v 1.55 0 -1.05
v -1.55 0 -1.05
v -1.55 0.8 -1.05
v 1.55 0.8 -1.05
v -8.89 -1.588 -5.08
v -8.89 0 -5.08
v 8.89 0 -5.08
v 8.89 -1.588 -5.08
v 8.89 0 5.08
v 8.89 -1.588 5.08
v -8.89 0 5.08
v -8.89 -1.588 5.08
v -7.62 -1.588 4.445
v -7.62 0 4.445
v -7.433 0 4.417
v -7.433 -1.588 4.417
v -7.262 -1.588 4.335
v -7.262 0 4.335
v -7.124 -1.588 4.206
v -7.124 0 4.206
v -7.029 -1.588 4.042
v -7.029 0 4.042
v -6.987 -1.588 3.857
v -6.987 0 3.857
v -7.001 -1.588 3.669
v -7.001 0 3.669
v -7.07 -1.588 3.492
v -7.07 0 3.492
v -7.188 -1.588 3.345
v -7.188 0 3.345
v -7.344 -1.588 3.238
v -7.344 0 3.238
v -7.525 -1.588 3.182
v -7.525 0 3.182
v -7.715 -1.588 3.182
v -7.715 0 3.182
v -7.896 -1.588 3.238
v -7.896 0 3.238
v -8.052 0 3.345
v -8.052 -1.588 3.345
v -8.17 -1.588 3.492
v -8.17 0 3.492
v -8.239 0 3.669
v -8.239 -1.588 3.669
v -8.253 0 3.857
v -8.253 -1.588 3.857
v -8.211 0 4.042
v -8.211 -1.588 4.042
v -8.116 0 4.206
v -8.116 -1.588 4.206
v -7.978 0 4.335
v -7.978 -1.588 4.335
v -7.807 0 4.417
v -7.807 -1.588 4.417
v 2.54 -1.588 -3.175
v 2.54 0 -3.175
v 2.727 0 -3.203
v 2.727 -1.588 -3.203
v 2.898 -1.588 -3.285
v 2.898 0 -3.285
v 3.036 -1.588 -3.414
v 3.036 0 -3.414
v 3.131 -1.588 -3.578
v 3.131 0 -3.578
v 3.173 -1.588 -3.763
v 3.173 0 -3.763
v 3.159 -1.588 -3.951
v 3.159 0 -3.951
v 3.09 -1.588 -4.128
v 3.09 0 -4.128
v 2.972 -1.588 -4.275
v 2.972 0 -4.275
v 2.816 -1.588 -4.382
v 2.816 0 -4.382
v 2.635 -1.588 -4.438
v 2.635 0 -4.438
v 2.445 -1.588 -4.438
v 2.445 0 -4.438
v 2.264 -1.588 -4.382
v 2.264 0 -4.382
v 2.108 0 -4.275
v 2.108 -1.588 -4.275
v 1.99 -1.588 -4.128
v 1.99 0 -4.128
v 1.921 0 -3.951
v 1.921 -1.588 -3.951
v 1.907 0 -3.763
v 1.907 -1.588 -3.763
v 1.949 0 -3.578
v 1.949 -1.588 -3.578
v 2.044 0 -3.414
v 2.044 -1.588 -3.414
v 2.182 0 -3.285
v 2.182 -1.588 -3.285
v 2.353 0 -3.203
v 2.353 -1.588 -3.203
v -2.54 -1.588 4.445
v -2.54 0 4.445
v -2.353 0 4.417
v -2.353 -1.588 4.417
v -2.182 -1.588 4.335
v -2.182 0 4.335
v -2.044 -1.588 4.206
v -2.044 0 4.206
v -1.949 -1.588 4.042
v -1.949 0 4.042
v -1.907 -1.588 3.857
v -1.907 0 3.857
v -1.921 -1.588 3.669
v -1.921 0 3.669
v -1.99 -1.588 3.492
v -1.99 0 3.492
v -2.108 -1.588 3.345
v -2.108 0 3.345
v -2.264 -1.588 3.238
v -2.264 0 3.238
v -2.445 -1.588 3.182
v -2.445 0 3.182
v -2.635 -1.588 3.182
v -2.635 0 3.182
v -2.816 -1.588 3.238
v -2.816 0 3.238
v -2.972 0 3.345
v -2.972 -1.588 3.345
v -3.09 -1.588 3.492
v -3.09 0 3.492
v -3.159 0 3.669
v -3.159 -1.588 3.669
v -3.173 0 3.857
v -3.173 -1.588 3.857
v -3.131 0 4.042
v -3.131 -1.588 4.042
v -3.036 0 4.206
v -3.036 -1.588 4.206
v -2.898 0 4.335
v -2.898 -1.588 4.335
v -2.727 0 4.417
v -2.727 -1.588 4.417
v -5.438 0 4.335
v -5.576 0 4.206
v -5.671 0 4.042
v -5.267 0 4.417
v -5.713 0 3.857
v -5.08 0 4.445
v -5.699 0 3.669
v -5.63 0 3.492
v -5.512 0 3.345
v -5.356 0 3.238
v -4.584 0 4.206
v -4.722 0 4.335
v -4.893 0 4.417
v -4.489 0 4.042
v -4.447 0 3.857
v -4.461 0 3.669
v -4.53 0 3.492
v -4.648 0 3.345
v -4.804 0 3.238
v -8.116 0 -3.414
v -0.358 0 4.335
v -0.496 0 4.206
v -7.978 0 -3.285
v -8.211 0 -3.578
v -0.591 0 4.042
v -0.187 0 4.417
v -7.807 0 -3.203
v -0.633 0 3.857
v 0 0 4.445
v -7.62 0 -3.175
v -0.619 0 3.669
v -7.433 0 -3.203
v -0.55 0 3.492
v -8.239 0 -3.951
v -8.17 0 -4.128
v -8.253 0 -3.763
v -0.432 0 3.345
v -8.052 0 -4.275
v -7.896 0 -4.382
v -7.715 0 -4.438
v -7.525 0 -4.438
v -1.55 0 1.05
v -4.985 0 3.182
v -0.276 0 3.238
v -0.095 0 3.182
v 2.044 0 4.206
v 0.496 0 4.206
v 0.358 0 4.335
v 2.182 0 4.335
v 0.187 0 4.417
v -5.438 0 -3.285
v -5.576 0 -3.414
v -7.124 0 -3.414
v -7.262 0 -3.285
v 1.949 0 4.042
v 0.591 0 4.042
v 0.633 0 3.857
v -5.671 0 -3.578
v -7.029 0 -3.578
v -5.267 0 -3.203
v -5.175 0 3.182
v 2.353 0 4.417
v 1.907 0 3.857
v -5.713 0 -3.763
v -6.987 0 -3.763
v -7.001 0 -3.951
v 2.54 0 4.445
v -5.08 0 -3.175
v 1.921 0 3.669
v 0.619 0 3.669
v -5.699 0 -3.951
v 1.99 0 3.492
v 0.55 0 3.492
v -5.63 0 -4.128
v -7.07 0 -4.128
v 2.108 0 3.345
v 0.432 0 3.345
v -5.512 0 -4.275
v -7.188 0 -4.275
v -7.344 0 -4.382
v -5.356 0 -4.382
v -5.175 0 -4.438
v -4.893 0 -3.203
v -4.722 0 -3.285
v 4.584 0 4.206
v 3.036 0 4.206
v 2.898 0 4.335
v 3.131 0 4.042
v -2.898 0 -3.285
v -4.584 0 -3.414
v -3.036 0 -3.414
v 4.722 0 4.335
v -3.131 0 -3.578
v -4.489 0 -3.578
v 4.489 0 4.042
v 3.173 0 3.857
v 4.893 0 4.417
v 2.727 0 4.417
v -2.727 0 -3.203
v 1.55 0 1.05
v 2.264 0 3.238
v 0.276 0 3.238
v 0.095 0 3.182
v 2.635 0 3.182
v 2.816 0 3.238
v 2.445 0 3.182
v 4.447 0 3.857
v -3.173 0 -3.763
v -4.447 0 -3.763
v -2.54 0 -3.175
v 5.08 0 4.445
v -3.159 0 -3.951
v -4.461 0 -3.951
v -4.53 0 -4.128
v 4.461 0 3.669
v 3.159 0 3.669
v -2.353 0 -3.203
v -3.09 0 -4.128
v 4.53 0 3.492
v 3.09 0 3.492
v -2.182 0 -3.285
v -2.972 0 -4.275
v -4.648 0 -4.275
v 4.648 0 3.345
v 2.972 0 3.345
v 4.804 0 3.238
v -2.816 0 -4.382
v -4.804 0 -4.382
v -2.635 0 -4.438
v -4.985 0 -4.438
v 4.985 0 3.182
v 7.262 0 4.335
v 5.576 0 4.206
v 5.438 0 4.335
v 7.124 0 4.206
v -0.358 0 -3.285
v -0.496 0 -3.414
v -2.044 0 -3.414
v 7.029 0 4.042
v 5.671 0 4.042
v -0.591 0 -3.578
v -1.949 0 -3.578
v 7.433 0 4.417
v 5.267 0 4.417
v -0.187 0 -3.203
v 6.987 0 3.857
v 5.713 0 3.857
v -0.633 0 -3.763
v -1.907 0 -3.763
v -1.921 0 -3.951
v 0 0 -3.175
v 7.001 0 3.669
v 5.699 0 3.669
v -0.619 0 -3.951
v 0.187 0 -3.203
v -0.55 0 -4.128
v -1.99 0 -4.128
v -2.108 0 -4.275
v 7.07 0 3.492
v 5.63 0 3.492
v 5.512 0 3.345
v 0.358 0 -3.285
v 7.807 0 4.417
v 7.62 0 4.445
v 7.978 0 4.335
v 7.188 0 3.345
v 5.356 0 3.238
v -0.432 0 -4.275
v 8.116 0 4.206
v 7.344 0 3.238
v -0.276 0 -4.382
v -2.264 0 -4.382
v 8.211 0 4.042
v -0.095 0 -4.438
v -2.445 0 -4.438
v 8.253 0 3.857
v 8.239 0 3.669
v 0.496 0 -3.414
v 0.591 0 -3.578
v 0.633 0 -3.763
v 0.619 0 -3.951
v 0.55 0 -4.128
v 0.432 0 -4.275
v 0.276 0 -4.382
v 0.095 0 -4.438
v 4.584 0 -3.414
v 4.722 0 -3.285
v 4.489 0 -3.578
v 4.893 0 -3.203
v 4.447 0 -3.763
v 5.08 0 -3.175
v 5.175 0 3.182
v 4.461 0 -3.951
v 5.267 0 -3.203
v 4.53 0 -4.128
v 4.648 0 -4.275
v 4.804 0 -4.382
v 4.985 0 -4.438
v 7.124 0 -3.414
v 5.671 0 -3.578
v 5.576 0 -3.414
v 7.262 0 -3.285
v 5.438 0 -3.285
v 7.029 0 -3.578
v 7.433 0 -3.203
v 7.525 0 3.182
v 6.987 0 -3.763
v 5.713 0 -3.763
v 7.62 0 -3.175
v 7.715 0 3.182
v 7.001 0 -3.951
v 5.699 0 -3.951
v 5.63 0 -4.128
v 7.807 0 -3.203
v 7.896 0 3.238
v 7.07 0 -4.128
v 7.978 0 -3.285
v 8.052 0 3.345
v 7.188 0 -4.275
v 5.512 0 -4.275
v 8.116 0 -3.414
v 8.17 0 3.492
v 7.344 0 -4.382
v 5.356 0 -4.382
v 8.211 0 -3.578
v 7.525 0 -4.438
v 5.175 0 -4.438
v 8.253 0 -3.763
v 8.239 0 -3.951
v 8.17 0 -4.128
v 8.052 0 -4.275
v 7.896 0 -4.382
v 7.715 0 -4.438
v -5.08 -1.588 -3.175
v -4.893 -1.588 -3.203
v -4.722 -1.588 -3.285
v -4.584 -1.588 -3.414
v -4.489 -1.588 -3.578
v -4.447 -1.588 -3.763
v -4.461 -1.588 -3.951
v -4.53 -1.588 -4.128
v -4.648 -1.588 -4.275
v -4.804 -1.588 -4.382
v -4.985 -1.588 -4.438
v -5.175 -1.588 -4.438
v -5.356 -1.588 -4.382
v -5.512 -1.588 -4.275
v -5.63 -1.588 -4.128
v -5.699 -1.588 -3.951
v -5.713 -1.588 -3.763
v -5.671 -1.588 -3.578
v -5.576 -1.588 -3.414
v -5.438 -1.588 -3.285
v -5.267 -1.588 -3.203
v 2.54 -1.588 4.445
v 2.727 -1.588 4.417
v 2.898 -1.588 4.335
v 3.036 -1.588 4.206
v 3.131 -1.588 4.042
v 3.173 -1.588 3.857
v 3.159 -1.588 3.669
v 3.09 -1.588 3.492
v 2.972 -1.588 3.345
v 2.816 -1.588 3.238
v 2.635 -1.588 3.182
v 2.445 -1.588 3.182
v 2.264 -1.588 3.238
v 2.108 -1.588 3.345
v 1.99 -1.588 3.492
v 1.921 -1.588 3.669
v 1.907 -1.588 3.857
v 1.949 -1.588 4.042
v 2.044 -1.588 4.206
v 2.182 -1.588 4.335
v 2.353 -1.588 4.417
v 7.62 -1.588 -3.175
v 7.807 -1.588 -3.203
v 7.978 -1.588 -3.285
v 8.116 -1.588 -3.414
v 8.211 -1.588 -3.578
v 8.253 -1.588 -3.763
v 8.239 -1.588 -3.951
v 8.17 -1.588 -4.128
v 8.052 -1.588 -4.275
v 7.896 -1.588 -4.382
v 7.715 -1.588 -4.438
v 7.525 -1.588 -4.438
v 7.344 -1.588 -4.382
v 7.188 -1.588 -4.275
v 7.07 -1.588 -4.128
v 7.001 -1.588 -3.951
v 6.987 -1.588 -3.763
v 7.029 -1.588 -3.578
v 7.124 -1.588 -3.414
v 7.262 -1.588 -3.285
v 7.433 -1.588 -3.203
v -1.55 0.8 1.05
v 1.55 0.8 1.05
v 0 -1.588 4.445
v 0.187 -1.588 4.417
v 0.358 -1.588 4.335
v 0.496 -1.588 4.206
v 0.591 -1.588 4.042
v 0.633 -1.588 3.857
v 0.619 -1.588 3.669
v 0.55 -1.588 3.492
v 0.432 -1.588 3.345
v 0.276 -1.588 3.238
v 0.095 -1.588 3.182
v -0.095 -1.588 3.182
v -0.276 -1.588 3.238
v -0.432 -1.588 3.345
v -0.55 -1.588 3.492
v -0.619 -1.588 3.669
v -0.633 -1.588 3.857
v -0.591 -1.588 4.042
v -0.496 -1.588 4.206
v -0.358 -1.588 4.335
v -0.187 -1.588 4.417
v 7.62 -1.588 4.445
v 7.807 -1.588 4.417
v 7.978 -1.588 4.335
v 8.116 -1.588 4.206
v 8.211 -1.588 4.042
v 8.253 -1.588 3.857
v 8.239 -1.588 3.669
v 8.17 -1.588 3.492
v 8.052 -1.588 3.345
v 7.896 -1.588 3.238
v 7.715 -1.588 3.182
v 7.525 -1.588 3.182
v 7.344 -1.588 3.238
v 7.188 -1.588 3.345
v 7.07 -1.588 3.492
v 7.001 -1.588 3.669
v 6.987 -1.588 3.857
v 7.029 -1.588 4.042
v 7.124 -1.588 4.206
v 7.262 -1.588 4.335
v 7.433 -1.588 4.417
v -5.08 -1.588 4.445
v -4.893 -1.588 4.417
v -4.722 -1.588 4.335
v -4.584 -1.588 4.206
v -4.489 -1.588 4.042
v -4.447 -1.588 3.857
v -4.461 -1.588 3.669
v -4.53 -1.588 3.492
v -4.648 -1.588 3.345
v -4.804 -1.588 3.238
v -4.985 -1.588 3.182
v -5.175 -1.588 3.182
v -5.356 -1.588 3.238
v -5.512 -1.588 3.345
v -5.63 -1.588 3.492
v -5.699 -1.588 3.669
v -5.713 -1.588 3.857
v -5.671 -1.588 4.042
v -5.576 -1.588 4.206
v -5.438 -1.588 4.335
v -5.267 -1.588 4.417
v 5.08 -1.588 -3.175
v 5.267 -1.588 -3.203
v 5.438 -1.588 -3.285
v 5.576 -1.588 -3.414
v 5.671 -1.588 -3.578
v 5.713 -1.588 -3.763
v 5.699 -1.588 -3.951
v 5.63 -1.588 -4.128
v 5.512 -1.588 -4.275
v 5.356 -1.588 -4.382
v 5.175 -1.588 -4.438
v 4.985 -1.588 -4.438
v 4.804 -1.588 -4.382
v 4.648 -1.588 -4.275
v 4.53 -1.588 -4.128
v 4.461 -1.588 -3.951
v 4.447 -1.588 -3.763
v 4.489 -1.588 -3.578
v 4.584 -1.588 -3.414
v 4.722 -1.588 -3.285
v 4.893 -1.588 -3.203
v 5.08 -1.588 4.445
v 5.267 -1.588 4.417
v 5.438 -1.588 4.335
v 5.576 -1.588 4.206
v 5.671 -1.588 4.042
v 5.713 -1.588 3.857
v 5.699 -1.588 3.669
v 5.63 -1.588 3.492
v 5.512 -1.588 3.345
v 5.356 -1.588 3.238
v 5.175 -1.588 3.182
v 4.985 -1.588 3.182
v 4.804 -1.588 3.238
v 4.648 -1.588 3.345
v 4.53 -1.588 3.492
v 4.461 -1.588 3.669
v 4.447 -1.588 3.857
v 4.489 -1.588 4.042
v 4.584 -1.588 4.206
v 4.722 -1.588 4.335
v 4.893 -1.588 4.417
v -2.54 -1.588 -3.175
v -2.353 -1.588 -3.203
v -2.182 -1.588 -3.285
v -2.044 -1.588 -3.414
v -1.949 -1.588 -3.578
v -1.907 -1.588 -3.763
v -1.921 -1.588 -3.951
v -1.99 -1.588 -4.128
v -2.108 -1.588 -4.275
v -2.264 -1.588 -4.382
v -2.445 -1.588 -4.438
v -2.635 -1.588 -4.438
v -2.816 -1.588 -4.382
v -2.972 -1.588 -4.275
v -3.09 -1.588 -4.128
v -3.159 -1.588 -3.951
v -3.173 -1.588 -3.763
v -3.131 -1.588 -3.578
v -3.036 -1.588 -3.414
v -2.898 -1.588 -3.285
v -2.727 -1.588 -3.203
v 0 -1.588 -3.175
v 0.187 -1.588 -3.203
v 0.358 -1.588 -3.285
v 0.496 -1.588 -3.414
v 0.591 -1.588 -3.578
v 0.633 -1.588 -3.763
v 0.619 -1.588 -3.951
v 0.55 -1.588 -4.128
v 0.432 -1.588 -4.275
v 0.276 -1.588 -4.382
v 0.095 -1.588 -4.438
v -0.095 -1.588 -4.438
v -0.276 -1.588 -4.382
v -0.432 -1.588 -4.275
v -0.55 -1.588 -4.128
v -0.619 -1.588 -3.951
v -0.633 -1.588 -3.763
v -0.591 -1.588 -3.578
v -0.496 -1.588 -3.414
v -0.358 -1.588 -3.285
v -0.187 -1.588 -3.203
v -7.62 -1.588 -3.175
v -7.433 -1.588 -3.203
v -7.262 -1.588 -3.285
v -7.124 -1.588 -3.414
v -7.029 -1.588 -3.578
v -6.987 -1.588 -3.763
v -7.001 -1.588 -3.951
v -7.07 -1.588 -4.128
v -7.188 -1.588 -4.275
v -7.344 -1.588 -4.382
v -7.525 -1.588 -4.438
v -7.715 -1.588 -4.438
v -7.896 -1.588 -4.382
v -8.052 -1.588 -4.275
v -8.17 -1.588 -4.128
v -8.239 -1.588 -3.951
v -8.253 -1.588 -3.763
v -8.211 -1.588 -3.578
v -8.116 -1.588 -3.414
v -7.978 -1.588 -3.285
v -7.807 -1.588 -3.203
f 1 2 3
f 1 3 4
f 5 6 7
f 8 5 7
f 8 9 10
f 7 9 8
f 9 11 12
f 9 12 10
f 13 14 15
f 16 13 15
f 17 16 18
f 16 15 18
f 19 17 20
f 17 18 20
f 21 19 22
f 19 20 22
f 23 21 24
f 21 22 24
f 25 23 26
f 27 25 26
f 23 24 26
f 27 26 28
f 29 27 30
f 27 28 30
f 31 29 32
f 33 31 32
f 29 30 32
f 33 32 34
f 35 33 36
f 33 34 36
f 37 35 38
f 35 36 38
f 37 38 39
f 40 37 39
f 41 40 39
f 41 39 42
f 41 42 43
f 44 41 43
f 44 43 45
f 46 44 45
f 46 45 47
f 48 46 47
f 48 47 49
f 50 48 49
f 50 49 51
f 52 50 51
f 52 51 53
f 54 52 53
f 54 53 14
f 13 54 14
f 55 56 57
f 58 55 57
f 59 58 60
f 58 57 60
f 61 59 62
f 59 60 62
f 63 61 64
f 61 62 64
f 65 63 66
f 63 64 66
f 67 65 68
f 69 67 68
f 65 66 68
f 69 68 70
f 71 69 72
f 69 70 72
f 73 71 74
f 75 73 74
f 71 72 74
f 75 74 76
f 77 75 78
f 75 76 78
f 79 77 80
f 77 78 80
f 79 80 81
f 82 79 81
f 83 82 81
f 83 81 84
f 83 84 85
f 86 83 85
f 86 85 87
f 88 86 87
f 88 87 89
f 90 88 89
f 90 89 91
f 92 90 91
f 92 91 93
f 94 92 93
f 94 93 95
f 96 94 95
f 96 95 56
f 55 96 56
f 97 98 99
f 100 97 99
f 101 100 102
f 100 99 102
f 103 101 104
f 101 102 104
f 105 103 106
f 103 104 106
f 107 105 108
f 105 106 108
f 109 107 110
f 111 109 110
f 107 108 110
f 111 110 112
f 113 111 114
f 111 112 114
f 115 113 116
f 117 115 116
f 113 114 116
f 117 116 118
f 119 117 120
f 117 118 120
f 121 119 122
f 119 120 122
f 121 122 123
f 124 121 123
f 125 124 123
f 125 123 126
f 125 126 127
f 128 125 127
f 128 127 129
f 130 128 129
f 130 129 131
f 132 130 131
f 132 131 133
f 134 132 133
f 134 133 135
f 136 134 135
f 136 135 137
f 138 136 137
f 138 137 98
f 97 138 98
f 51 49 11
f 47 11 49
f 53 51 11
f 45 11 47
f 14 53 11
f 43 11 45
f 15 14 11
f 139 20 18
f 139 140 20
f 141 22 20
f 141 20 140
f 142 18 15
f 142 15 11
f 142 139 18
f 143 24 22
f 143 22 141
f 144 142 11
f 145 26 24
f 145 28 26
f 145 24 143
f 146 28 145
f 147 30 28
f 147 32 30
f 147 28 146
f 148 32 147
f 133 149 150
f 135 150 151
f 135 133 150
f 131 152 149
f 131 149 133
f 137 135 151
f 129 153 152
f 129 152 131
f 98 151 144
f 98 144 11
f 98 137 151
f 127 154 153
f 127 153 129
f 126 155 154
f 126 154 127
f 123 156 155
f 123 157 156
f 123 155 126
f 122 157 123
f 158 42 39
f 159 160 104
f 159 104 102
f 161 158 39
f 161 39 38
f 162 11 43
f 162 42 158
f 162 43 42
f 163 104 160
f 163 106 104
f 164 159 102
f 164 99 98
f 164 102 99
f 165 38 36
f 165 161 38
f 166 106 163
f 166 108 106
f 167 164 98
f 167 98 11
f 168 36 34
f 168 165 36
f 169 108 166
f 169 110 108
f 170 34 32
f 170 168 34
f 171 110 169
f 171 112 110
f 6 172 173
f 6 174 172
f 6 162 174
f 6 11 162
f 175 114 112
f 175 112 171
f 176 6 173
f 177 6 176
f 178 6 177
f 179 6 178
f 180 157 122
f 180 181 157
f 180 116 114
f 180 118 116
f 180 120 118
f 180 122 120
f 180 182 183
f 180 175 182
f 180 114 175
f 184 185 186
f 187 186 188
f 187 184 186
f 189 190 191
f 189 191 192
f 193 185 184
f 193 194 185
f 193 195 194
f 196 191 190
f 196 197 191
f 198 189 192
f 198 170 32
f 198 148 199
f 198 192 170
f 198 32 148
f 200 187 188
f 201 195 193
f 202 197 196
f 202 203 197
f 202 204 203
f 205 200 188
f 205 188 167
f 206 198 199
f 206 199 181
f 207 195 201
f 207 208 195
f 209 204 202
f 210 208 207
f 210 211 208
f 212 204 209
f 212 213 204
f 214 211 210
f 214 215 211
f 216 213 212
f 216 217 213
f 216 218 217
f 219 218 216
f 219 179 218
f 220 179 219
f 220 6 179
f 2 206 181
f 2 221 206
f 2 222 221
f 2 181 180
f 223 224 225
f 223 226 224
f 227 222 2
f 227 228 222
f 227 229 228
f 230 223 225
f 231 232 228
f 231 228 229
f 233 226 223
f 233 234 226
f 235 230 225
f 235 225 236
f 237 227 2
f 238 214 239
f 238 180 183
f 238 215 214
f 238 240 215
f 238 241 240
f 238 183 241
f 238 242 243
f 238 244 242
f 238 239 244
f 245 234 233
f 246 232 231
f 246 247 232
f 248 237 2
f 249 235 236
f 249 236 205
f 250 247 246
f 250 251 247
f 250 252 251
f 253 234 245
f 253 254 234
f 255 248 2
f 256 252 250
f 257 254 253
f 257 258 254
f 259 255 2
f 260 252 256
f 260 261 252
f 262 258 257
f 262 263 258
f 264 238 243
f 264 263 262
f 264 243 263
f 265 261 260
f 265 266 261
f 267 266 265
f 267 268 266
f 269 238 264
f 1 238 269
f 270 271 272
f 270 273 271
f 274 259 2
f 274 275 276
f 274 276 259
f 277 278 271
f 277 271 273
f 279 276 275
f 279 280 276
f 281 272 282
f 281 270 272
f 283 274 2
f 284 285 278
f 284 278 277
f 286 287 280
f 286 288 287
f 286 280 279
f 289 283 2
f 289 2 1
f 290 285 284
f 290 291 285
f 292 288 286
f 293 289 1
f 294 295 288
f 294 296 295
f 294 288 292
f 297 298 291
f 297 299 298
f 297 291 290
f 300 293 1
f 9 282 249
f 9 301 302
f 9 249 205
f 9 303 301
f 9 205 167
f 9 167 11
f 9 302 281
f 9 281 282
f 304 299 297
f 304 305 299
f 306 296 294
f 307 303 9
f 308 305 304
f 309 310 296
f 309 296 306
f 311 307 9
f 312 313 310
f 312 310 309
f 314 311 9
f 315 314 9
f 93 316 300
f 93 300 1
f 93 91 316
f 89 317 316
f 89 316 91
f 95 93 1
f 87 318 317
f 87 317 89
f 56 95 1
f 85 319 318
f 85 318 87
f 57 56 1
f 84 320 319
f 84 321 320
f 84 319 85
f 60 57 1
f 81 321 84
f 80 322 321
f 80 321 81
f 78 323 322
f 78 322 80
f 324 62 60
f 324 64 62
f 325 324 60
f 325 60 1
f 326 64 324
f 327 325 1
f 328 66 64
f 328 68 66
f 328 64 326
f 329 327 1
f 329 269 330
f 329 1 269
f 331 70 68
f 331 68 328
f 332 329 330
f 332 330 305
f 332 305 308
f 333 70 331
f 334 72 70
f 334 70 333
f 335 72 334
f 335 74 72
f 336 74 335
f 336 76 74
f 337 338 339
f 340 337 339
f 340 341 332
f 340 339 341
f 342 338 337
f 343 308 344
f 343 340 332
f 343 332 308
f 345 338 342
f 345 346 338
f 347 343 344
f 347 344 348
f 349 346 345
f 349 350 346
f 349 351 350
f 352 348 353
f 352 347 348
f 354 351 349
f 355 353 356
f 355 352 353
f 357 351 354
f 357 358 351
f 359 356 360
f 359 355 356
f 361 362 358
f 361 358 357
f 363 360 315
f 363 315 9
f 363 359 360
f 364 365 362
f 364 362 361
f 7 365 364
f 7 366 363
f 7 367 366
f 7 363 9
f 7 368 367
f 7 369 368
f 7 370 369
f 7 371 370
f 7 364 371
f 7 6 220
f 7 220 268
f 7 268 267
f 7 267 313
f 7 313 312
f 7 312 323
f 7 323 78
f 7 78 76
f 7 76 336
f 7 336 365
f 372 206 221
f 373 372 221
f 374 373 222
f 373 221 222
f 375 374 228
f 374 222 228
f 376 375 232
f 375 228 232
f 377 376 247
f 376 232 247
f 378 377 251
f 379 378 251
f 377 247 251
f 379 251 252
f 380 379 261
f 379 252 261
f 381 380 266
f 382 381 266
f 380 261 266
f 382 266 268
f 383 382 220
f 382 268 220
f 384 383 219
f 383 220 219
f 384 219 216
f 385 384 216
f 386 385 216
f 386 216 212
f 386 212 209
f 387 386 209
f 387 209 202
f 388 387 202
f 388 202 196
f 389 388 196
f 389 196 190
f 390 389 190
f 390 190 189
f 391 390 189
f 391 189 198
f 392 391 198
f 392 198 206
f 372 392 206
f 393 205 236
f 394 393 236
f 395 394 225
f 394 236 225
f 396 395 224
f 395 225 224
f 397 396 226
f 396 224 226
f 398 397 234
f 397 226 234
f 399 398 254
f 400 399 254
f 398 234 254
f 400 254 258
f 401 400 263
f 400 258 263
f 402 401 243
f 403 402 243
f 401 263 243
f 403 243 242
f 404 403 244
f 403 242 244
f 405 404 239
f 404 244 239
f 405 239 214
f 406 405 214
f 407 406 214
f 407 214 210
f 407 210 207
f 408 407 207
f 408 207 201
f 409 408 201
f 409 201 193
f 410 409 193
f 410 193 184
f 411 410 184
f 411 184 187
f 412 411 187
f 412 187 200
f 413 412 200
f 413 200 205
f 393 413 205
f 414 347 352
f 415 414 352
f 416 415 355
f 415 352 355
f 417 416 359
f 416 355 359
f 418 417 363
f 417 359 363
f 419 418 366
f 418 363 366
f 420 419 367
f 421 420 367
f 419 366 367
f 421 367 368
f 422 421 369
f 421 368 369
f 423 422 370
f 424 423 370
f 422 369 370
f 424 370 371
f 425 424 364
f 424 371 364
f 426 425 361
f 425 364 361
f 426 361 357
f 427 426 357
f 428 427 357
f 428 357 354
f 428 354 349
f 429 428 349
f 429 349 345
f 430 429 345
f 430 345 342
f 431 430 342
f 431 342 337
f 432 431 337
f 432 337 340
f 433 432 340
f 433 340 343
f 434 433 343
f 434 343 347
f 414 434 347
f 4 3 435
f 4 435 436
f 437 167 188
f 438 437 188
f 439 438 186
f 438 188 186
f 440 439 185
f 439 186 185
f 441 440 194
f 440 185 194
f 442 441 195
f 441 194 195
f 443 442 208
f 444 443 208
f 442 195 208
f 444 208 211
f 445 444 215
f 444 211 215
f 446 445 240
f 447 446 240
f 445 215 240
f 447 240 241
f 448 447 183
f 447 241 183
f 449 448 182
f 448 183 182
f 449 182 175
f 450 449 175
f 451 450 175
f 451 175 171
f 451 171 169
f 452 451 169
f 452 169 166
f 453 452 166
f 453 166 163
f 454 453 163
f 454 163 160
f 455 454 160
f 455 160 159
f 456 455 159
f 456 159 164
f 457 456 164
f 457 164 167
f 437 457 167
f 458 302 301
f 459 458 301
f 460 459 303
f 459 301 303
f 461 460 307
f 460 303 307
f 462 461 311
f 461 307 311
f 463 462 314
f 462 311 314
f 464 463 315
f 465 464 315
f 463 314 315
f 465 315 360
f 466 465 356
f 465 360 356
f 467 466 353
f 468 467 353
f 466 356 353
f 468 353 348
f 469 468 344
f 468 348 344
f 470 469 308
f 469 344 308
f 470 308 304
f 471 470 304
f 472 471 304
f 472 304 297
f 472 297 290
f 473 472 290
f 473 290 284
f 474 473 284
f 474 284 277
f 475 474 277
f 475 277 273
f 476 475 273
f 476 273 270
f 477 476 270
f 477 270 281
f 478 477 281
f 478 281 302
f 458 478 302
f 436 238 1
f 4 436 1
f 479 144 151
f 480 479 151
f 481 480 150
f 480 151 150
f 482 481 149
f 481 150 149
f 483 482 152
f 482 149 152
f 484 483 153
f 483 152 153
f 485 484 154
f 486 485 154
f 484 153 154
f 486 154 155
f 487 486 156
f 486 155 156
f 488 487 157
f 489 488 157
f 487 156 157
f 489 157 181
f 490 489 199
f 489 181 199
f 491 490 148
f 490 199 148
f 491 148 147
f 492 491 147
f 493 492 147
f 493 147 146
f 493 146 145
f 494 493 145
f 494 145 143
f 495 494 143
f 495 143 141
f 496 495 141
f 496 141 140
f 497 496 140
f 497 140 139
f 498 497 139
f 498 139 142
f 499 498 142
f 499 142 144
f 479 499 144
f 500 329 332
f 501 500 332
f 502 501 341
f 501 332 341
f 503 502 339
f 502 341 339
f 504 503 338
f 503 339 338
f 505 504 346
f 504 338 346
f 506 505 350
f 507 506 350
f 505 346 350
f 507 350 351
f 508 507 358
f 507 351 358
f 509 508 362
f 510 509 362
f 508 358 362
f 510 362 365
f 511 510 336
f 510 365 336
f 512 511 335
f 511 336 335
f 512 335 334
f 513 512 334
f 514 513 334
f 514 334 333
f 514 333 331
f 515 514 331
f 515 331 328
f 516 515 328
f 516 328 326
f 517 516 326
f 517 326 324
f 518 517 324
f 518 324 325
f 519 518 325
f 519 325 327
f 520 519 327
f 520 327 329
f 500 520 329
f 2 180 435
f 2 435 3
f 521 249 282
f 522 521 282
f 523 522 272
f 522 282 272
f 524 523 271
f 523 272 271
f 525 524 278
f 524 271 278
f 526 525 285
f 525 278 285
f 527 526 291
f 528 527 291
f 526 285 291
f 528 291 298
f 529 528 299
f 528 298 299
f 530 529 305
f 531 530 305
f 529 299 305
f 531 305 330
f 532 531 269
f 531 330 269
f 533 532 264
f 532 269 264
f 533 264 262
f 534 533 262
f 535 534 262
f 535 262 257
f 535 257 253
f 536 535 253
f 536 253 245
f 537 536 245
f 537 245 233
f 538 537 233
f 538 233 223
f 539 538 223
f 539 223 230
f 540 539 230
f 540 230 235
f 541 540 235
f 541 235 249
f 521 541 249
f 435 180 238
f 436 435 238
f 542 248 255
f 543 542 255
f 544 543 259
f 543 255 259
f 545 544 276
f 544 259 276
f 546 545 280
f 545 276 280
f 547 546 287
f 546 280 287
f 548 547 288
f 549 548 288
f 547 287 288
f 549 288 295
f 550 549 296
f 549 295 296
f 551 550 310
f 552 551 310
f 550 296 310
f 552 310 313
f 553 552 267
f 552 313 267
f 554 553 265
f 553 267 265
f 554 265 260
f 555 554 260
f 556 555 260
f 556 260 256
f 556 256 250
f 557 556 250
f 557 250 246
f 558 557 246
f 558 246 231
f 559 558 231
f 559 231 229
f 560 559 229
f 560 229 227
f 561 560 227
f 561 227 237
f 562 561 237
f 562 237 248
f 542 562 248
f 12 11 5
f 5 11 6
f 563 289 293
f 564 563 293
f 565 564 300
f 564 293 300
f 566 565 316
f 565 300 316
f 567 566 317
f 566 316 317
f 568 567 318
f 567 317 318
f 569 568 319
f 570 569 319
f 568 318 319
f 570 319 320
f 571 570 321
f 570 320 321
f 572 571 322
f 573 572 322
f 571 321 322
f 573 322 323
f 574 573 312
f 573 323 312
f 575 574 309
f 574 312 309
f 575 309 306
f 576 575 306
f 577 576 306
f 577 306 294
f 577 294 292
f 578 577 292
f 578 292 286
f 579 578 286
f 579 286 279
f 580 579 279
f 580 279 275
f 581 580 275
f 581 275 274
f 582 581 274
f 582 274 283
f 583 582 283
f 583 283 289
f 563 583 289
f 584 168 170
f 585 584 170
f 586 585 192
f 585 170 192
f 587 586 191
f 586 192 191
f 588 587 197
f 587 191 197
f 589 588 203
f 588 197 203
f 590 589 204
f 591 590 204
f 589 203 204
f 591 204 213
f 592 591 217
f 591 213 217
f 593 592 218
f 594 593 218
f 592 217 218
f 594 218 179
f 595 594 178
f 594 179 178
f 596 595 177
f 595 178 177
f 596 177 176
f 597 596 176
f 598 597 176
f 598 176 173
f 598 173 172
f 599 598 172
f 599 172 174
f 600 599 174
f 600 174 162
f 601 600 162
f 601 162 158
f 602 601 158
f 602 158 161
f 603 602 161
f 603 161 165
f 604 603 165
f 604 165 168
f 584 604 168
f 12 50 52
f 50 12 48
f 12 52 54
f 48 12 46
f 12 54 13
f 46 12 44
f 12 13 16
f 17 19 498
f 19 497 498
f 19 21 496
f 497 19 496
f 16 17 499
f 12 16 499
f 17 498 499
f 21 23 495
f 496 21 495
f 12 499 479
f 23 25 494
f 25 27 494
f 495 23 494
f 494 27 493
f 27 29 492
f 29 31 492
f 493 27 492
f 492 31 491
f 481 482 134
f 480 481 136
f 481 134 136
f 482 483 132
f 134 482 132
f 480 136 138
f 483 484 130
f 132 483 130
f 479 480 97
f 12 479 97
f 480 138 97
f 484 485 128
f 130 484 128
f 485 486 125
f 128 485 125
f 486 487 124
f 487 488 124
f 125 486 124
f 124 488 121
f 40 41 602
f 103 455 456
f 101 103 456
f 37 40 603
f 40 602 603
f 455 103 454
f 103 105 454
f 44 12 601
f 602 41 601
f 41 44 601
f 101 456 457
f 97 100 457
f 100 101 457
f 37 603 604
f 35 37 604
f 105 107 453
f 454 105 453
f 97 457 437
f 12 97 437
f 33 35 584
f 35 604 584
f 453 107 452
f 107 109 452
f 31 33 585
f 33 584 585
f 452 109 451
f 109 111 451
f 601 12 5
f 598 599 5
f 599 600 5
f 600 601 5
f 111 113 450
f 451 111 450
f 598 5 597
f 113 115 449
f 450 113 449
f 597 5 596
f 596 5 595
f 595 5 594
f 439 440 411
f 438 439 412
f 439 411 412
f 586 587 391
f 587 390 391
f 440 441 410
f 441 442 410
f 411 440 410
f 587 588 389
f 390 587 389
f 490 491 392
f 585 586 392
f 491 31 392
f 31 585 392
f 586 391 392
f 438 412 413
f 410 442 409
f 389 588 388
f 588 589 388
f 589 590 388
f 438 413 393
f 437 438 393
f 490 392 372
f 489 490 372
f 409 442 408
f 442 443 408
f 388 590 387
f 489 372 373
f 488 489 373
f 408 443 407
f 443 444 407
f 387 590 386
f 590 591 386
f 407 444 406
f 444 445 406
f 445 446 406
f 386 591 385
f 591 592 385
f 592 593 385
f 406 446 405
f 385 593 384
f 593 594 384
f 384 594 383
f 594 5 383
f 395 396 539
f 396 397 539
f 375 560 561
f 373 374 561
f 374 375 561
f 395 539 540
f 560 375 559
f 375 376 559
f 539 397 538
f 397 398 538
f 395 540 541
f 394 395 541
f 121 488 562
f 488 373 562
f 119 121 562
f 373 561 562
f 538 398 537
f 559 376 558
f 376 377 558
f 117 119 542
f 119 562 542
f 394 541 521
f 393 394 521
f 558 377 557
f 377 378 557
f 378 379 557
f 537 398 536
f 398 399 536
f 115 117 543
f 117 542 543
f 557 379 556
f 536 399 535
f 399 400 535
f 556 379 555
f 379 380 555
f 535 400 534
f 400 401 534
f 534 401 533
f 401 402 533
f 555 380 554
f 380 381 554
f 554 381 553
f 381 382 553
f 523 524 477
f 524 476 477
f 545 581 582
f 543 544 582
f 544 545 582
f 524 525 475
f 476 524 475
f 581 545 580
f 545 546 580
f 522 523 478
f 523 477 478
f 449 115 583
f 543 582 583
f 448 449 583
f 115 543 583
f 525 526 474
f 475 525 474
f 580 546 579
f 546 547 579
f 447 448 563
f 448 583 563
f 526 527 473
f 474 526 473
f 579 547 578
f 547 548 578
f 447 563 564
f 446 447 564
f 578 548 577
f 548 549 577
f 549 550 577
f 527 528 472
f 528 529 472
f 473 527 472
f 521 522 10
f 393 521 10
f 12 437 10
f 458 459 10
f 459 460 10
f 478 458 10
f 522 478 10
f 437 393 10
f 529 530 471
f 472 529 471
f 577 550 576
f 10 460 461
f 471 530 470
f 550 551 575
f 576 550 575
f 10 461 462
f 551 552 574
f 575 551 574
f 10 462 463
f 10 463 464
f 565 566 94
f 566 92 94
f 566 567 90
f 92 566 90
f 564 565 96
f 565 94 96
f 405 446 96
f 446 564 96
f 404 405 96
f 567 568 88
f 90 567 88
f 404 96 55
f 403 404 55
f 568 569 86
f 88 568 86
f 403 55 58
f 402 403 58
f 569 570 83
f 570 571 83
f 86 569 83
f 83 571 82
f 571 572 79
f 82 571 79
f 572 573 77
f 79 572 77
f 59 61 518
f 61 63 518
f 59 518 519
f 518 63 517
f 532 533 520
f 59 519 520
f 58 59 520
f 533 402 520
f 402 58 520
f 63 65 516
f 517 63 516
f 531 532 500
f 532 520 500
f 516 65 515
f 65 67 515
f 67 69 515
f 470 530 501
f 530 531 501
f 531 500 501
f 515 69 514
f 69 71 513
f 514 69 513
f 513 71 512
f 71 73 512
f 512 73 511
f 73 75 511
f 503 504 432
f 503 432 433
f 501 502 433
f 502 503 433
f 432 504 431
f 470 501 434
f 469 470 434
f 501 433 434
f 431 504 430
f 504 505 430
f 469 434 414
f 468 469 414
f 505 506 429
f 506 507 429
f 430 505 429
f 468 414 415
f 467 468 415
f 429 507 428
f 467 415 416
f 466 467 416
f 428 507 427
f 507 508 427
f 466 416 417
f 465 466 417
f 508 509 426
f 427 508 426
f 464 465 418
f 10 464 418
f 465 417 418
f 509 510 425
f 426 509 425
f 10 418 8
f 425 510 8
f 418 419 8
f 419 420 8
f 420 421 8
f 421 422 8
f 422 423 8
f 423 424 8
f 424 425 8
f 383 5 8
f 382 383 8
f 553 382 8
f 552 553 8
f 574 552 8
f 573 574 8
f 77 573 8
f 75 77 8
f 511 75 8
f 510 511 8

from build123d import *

# Parameters (mm, degrees)
SKETCH1_W           = 17.78
SKETCH1_H           = 10.16
BOSS_EXTRUDE1_DEPTH = 1.5875
SKETCH2_W           = 3.1
SKETCH2_H           = 2.1
BOSS_EXTRUDE2_DEPTH = 0.8
CUT_EXTRUDE1_REACH  = 12.361
SKETCH3_R           = 0.635


with BuildPart() as part:
    # Sketch1 → Boss-Extrude1 (new body)
    with BuildSketch(Plane(origin=(0, 0, 0), x_dir=(1, 0, 0), z_dir=(0, 1, 0))):
        Rectangle(SKETCH1_W, SKETCH1_H)
    extrude(amount=-BOSS_EXTRUDE1_DEPTH)

    # Sketch2 → Boss-Extrude2 (add)
    with BuildSketch(Plane(origin=(0, 0, 0), x_dir=(1, 0, 0), z_dir=(0, 1, 0))):
        Rectangle(SKETCH2_W, SKETCH2_H)
    extrude(amount=BOSS_EXTRUDE2_DEPTH)

    # Sketch3 → Cut-Extrude1 (cut, up to next)
    with BuildSketch(Plane(origin=(0, 0, 0), x_dir=(1, 0, 0), z_dir=(0, 1, 0)), mode=Mode.PRIVATE) as cut_extrude1_sk1:
        with Locations(Location((-7.62, 3.81, 0), (0, 0, 270))):
            Circle(SKETCH3_R)
    cut_extrude1_tool1 = extrude(cut_extrude1_sk1.sketch, amount=-CUT_EXTRUDE1_REACH, mode=Mode.PRIVATE) & part.part
    # Sketch3 → Cut-Extrude1 (cut, up to next)
    with BuildSketch(Plane(origin=(0, 0, 0), x_dir=(1, 0, 0), z_dir=(0, 1, 0)), mode=Mode.PRIVATE) as cut_extrude1_sk2:
        with Locations(Location((-7.62, -3.81, 0), (0, 0, 270))):
            Circle(SKETCH3_R)
    cut_extrude1_tool2 = extrude(cut_extrude1_sk2.sketch, amount=-CUT_EXTRUDE1_REACH, mode=Mode.PRIVATE) & part.part
    # Sketch3 → Cut-Extrude1 (cut, up to next)
    with BuildSketch(Plane(origin=(0, 0, 0), x_dir=(1, 0, 0), z_dir=(0, 1, 0)), mode=Mode.PRIVATE) as cut_extrude1_sk3:
        with Locations(Location((-5.08, 3.81, 0), (0, 0, 270))):
            Circle(SKETCH3_R)
    cut_extrude1_tool3 = extrude(cut_extrude1_sk3.sketch, amount=-CUT_EXTRUDE1_REACH, mode=Mode.PRIVATE) & part.part
    # Sketch3 → Cut-Extrude1 (cut, up to next)
    with BuildSketch(Plane(origin=(0, 0, 0), x_dir=(1, 0, 0), z_dir=(0, 1, 0)), mode=Mode.PRIVATE) as cut_extrude1_sk4:
        with Locations(Location((-5.08, -3.81, 0), (0, 0, 270))):
            Circle(SKETCH3_R)
    cut_extrude1_tool4 = extrude(cut_extrude1_sk4.sketch, amount=-CUT_EXTRUDE1_REACH, mode=Mode.PRIVATE) & part.part
    # Sketch3 → Cut-Extrude1 (cut, up to next)
    with BuildSketch(Plane(origin=(0, 0, 0), x_dir=(1, 0, 0), z_dir=(0, 1, 0)), mode=Mode.PRIVATE) as cut_extrude1_sk5:
        with Locations(Location((-2.54, 3.81, 0), (0, 0, 270))):
            Circle(SKETCH3_R)
    cut_extrude1_tool5 = extrude(cut_extrude1_sk5.sketch, amount=-CUT_EXTRUDE1_REACH, mode=Mode.PRIVATE) & part.part
    # Sketch3 → Cut-Extrude1 (cut, up to next)
    with BuildSketch(Plane(origin=(0, 0, 0), x_dir=(1, 0, 0), z_dir=(0, 1, 0)), mode=Mode.PRIVATE) as cut_extrude1_sk6:
        with Locations(Location((-2.54, -3.81, 0), (0, 0, 270))):
            Circle(SKETCH3_R)
    cut_extrude1_tool6 = extrude(cut_extrude1_sk6.sketch, amount=-CUT_EXTRUDE1_REACH, mode=Mode.PRIVATE) & part.part
    # Sketch3 → Cut-Extrude1 (cut, up to next)
    with BuildSketch(Plane(origin=(0, 0, 0), x_dir=(1, 0, 0), z_dir=(0, 1, 0)), mode=Mode.PRIVATE) as cut_extrude1_sk7:
        with Locations(Location((0, 3.81, 0), (0, 0, 270))):
            Circle(SKETCH3_R)
    cut_extrude1_tool7 = extrude(cut_extrude1_sk7.sketch, amount=-CUT_EXTRUDE1_REACH, mode=Mode.PRIVATE) & part.part
    # Sketch3 → Cut-Extrude1 (cut, up to next)
    with BuildSketch(Plane(origin=(0, 0, 0), x_dir=(1, 0, 0), z_dir=(0, 1, 0)), mode=Mode.PRIVATE) as cut_extrude1_sk8:
        with Locations(Location((0, -3.81, 0), (0, 0, 270))):
            Circle(SKETCH3_R)
    cut_extrude1_tool8 = extrude(cut_extrude1_sk8.sketch, amount=-CUT_EXTRUDE1_REACH, mode=Mode.PRIVATE) & part.part
    # Sketch3 → Cut-Extrude1 (cut, up to next)
    with BuildSketch(Plane(origin=(0, 0, 0), x_dir=(1, 0, 0), z_dir=(0, 1, 0)), mode=Mode.PRIVATE) as cut_extrude1_sk9:
        with Locations(Location((2.54, 3.81, 0), (0, 0, 270))):
            Circle(SKETCH3_R)
    cut_extrude1_tool9 = extrude(cut_extrude1_sk9.sketch, amount=-CUT_EXTRUDE1_REACH, mode=Mode.PRIVATE) & part.part
    # Sketch3 → Cut-Extrude1 (cut, up to next)
    with BuildSketch(Plane(origin=(0, 0, 0), x_dir=(1, 0, 0), z_dir=(0, 1, 0)), mode=Mode.PRIVATE) as cut_extrude1_sk10:
        with Locations(Location((2.54, -3.81, 0), (0, 0, 270))):
            Circle(SKETCH3_R)
    cut_extrude1_tool10 = extrude(cut_extrude1_sk10.sketch, amount=-CUT_EXTRUDE1_REACH, mode=Mode.PRIVATE) & part.part
    # Sketch3 → Cut-Extrude1 (cut, up to next)
    with BuildSketch(Plane(origin=(0, 0, 0), x_dir=(1, 0, 0), z_dir=(0, 1, 0)), mode=Mode.PRIVATE) as cut_extrude1_sk11:
        with Locations(Location((5.08, 3.81, 0), (0, 0, 270))):
            Circle(SKETCH3_R)
    cut_extrude1_tool11 = extrude(cut_extrude1_sk11.sketch, amount=-CUT_EXTRUDE1_REACH, mode=Mode.PRIVATE) & part.part
    # Sketch3 → Cut-Extrude1 (cut, up to next)
    with BuildSketch(Plane(origin=(0, 0, 0), x_dir=(1, 0, 0), z_dir=(0, 1, 0)), mode=Mode.PRIVATE) as cut_extrude1_sk12:
        with Locations(Location((5.08, -3.81, 0), (0, 0, 270))):
            Circle(SKETCH3_R)
    cut_extrude1_tool12 = extrude(cut_extrude1_sk12.sketch, amount=-CUT_EXTRUDE1_REACH, mode=Mode.PRIVATE) & part.part
    # Sketch3 → Cut-Extrude1 (cut, up to next)
    with BuildSketch(Plane(origin=(0, 0, 0), x_dir=(1, 0, 0), z_dir=(0, 1, 0)), mode=Mode.PRIVATE) as cut_extrude1_sk13:
        with Locations(Location((7.62, 3.81, 0), (0, 0, 270))):
            Circle(SKETCH3_R)
    cut_extrude1_tool13 = extrude(cut_extrude1_sk13.sketch, amount=-CUT_EXTRUDE1_REACH, mode=Mode.PRIVATE) & part.part
    # Sketch3 → Cut-Extrude1 (cut, up to next)
    with BuildSketch(Plane(origin=(0, 0, 0), x_dir=(1, 0, 0), z_dir=(0, 1, 0)), mode=Mode.PRIVATE) as cut_extrude1_sk14:
        with Locations(Location((7.62, -3.81, 0), (0, 0, 270))):
            Circle(SKETCH3_R)
    cut_extrude1_tool14 = extrude(cut_extrude1_sk14.sketch, amount=-CUT_EXTRUDE1_REACH, mode=Mode.PRIVATE) & part.part
    add(cut_extrude1_tool1.solids().sort_by_distance((-7.62, 0, -3.81))[0], mode=Mode.SUBTRACT)
    add(cut_extrude1_tool2.solids().sort_by_distance((-7.62, 0, 3.81))[0], mode=Mode.SUBTRACT)
    add(cut_extrude1_tool3.solids().sort_by_distance((-5.08, 0, -3.81))[0], mode=Mode.SUBTRACT)
    add(cut_extrude1_tool4.solids().sort_by_distance((-5.08, 0, 3.81))[0], mode=Mode.SUBTRACT)
    add(cut_extrude1_tool5.solids().sort_by_distance((-2.54, 0, -3.81))[0], mode=Mode.SUBTRACT)
    add(cut_extrude1_tool6.solids().sort_by_distance((-2.54, 0, 3.81))[0], mode=Mode.SUBTRACT)
    add(cut_extrude1_tool7.solids().sort_by_distance((0, 0, -3.81))[0], mode=Mode.SUBTRACT)
    add(cut_extrude1_tool8.solids().sort_by_distance((0, 0, 3.81))[0], mode=Mode.SUBTRACT)
    add(cut_extrude1_tool9.solids().sort_by_distance((2.54, 0, -3.81))[0], mode=Mode.SUBTRACT)
    add(cut_extrude1_tool10.solids().sort_by_distance((2.54, 0, 3.81))[0], mode=Mode.SUBTRACT)
    add(cut_extrude1_tool11.solids().sort_by_distance((5.08, 0, -3.81))[0], mode=Mode.SUBTRACT)
    add(cut_extrude1_tool12.solids().sort_by_distance((5.08, 0, 3.81))[0], mode=Mode.SUBTRACT)
    add(cut_extrude1_tool13.solids().sort_by_distance((7.62, 0, -3.81))[0], mode=Mode.SUBTRACT)
    add(cut_extrude1_tool14.solids().sort_by_distance((7.62, 0, 3.81))[0], mode=Mode.SUBTRACT)


solid = part.part
